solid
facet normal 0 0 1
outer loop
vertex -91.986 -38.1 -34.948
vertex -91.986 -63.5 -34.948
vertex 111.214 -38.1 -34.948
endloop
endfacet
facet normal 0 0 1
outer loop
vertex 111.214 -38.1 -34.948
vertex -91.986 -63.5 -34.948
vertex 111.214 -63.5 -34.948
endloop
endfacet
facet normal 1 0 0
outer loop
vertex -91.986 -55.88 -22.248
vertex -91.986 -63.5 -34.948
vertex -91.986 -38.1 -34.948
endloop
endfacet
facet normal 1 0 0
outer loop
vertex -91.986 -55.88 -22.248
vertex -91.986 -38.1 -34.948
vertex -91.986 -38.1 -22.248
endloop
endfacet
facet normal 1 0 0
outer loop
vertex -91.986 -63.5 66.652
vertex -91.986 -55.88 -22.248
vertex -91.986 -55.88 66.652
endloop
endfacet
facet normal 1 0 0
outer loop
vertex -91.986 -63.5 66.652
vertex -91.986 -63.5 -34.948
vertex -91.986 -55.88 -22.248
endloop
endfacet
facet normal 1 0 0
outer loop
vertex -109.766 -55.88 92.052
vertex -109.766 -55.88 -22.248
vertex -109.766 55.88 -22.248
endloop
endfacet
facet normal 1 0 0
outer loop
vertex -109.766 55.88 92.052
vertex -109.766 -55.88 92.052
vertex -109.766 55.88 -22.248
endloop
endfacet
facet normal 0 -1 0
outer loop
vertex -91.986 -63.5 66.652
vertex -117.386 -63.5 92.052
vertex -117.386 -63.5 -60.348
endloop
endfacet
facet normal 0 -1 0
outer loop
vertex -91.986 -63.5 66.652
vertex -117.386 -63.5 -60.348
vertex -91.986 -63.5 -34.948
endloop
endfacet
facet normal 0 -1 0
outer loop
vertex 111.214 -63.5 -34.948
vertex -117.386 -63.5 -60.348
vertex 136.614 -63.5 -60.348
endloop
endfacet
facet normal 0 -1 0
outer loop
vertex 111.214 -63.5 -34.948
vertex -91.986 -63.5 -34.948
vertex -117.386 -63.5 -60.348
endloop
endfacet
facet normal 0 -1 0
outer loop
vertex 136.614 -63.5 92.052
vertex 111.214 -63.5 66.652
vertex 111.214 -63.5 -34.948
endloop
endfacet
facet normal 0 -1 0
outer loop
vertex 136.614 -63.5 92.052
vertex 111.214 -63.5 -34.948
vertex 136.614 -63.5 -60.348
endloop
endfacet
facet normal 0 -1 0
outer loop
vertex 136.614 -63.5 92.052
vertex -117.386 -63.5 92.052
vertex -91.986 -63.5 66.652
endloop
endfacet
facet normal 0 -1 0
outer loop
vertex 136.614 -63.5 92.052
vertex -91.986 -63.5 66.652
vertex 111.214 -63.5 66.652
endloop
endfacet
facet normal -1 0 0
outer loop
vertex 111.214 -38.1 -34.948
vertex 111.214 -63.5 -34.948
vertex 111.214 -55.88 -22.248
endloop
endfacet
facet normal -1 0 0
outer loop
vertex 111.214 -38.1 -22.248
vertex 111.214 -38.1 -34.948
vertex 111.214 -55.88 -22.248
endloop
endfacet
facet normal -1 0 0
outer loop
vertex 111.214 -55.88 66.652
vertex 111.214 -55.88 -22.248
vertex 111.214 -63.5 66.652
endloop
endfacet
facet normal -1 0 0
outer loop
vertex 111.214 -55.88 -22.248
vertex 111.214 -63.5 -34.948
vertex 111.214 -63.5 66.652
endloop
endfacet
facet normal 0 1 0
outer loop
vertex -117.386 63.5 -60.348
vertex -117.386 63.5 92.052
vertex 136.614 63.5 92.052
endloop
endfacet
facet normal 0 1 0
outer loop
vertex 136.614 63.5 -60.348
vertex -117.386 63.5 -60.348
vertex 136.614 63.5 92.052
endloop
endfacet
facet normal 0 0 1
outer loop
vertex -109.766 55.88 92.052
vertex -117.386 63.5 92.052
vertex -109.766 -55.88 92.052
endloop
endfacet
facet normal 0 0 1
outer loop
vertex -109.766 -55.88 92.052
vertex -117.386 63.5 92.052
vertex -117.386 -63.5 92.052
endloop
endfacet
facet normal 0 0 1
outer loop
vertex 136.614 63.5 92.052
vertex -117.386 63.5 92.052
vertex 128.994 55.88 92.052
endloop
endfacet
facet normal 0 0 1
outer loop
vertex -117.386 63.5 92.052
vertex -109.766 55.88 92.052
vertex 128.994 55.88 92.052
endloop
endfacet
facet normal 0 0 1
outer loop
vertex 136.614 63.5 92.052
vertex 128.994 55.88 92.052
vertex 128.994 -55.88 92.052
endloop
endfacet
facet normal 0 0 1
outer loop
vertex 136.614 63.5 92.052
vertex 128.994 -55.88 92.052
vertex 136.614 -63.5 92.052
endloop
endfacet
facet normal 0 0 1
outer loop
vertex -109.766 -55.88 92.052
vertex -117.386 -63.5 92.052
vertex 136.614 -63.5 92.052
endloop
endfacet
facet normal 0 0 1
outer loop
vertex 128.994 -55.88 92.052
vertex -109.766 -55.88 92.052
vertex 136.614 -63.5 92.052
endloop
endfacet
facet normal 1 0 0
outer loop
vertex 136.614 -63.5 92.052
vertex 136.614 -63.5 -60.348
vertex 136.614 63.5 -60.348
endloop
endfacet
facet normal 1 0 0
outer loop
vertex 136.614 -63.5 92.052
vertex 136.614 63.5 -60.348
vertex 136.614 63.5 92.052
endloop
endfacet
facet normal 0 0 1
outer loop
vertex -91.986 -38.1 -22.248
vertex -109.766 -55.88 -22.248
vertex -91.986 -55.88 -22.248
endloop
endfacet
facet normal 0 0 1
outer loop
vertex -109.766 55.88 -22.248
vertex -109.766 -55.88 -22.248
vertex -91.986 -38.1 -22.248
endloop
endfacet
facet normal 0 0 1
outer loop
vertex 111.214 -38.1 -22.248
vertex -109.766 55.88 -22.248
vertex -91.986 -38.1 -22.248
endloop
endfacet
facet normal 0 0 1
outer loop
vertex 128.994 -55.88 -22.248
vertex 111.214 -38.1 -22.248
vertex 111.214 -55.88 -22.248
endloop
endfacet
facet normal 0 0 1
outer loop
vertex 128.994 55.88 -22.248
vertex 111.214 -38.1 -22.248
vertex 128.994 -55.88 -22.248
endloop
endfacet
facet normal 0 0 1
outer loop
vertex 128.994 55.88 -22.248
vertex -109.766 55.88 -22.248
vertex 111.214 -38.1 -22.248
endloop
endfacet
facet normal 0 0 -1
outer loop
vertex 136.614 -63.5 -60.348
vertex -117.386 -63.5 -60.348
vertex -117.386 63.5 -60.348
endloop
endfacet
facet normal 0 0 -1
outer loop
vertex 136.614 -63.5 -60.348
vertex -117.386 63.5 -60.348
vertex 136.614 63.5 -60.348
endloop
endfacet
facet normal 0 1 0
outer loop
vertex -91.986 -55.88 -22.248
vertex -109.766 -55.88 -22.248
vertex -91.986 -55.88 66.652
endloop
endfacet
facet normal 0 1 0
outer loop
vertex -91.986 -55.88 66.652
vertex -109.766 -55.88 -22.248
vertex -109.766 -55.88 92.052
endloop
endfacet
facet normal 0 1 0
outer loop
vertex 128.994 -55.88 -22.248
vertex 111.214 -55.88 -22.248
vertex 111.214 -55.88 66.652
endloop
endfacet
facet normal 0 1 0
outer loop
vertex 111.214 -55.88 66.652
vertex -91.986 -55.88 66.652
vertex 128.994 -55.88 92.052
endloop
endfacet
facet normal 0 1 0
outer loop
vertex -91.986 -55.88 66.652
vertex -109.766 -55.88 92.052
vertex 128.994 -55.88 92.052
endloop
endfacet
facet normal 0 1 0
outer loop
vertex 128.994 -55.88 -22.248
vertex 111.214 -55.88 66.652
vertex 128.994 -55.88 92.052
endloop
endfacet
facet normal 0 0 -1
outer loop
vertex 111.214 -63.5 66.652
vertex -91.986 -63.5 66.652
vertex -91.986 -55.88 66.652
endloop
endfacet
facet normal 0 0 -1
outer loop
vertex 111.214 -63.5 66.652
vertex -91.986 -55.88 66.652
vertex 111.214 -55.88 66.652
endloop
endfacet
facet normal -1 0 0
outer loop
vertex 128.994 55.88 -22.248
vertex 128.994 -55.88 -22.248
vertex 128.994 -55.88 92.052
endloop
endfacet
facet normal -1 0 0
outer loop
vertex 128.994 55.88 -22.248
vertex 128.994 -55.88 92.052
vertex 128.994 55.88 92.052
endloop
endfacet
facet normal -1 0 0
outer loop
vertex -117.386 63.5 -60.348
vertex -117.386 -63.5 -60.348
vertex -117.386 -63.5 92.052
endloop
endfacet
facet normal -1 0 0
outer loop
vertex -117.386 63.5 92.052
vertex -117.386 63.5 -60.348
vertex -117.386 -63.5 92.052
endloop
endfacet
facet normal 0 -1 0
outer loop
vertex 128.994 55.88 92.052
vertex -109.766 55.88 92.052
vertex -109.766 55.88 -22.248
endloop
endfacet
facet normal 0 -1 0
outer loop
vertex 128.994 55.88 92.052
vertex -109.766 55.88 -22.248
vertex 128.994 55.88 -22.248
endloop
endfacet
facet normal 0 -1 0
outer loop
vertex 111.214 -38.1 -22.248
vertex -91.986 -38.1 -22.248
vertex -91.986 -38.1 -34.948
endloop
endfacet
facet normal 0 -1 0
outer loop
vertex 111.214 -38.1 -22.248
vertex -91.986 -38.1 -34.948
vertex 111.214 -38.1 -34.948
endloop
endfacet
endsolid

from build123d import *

# Parameters (mm, degrees)
F0_W     = 254
F0_H     = 152.4
F1_DEPTH = 63.5
F2_W     = 238.76
F2_H     = 111.76
F3_DEPTH = 114.3
F4_W     = 203.2
F4_H     = 101.6
F5_DEPTH = 25.4


with BuildPart() as f1:
    # F0 (on Front) → F1 (new body, symmetric)
    with BuildSketch(Plane.XZ):
        with Locations((9.614129, 15.851616)):
            Rectangle(F0_W, F0_H)
    extrude(amount=F1_DEPTH, both=True)

    # F2 (on face) → F3 (cut)
    with BuildSketch(Plane.XY.offset(92.051616)):
        with Locations((9.614129, 0)):
            Rectangle(F2_W, F2_H)
    extrude(amount=-F3_DEPTH, mode=Mode.SUBTRACT)

    # F4 (on face) → F5 (cut)
    with BuildSketch(Plane.XZ.offset(63.5)):
        with Locations((9.614129, 15.851616)):
            Rectangle(F4_W, F4_H)
    extrude(amount=-F5_DEPTH, mode=Mode.SUBTRACT)


solid = f1.part
